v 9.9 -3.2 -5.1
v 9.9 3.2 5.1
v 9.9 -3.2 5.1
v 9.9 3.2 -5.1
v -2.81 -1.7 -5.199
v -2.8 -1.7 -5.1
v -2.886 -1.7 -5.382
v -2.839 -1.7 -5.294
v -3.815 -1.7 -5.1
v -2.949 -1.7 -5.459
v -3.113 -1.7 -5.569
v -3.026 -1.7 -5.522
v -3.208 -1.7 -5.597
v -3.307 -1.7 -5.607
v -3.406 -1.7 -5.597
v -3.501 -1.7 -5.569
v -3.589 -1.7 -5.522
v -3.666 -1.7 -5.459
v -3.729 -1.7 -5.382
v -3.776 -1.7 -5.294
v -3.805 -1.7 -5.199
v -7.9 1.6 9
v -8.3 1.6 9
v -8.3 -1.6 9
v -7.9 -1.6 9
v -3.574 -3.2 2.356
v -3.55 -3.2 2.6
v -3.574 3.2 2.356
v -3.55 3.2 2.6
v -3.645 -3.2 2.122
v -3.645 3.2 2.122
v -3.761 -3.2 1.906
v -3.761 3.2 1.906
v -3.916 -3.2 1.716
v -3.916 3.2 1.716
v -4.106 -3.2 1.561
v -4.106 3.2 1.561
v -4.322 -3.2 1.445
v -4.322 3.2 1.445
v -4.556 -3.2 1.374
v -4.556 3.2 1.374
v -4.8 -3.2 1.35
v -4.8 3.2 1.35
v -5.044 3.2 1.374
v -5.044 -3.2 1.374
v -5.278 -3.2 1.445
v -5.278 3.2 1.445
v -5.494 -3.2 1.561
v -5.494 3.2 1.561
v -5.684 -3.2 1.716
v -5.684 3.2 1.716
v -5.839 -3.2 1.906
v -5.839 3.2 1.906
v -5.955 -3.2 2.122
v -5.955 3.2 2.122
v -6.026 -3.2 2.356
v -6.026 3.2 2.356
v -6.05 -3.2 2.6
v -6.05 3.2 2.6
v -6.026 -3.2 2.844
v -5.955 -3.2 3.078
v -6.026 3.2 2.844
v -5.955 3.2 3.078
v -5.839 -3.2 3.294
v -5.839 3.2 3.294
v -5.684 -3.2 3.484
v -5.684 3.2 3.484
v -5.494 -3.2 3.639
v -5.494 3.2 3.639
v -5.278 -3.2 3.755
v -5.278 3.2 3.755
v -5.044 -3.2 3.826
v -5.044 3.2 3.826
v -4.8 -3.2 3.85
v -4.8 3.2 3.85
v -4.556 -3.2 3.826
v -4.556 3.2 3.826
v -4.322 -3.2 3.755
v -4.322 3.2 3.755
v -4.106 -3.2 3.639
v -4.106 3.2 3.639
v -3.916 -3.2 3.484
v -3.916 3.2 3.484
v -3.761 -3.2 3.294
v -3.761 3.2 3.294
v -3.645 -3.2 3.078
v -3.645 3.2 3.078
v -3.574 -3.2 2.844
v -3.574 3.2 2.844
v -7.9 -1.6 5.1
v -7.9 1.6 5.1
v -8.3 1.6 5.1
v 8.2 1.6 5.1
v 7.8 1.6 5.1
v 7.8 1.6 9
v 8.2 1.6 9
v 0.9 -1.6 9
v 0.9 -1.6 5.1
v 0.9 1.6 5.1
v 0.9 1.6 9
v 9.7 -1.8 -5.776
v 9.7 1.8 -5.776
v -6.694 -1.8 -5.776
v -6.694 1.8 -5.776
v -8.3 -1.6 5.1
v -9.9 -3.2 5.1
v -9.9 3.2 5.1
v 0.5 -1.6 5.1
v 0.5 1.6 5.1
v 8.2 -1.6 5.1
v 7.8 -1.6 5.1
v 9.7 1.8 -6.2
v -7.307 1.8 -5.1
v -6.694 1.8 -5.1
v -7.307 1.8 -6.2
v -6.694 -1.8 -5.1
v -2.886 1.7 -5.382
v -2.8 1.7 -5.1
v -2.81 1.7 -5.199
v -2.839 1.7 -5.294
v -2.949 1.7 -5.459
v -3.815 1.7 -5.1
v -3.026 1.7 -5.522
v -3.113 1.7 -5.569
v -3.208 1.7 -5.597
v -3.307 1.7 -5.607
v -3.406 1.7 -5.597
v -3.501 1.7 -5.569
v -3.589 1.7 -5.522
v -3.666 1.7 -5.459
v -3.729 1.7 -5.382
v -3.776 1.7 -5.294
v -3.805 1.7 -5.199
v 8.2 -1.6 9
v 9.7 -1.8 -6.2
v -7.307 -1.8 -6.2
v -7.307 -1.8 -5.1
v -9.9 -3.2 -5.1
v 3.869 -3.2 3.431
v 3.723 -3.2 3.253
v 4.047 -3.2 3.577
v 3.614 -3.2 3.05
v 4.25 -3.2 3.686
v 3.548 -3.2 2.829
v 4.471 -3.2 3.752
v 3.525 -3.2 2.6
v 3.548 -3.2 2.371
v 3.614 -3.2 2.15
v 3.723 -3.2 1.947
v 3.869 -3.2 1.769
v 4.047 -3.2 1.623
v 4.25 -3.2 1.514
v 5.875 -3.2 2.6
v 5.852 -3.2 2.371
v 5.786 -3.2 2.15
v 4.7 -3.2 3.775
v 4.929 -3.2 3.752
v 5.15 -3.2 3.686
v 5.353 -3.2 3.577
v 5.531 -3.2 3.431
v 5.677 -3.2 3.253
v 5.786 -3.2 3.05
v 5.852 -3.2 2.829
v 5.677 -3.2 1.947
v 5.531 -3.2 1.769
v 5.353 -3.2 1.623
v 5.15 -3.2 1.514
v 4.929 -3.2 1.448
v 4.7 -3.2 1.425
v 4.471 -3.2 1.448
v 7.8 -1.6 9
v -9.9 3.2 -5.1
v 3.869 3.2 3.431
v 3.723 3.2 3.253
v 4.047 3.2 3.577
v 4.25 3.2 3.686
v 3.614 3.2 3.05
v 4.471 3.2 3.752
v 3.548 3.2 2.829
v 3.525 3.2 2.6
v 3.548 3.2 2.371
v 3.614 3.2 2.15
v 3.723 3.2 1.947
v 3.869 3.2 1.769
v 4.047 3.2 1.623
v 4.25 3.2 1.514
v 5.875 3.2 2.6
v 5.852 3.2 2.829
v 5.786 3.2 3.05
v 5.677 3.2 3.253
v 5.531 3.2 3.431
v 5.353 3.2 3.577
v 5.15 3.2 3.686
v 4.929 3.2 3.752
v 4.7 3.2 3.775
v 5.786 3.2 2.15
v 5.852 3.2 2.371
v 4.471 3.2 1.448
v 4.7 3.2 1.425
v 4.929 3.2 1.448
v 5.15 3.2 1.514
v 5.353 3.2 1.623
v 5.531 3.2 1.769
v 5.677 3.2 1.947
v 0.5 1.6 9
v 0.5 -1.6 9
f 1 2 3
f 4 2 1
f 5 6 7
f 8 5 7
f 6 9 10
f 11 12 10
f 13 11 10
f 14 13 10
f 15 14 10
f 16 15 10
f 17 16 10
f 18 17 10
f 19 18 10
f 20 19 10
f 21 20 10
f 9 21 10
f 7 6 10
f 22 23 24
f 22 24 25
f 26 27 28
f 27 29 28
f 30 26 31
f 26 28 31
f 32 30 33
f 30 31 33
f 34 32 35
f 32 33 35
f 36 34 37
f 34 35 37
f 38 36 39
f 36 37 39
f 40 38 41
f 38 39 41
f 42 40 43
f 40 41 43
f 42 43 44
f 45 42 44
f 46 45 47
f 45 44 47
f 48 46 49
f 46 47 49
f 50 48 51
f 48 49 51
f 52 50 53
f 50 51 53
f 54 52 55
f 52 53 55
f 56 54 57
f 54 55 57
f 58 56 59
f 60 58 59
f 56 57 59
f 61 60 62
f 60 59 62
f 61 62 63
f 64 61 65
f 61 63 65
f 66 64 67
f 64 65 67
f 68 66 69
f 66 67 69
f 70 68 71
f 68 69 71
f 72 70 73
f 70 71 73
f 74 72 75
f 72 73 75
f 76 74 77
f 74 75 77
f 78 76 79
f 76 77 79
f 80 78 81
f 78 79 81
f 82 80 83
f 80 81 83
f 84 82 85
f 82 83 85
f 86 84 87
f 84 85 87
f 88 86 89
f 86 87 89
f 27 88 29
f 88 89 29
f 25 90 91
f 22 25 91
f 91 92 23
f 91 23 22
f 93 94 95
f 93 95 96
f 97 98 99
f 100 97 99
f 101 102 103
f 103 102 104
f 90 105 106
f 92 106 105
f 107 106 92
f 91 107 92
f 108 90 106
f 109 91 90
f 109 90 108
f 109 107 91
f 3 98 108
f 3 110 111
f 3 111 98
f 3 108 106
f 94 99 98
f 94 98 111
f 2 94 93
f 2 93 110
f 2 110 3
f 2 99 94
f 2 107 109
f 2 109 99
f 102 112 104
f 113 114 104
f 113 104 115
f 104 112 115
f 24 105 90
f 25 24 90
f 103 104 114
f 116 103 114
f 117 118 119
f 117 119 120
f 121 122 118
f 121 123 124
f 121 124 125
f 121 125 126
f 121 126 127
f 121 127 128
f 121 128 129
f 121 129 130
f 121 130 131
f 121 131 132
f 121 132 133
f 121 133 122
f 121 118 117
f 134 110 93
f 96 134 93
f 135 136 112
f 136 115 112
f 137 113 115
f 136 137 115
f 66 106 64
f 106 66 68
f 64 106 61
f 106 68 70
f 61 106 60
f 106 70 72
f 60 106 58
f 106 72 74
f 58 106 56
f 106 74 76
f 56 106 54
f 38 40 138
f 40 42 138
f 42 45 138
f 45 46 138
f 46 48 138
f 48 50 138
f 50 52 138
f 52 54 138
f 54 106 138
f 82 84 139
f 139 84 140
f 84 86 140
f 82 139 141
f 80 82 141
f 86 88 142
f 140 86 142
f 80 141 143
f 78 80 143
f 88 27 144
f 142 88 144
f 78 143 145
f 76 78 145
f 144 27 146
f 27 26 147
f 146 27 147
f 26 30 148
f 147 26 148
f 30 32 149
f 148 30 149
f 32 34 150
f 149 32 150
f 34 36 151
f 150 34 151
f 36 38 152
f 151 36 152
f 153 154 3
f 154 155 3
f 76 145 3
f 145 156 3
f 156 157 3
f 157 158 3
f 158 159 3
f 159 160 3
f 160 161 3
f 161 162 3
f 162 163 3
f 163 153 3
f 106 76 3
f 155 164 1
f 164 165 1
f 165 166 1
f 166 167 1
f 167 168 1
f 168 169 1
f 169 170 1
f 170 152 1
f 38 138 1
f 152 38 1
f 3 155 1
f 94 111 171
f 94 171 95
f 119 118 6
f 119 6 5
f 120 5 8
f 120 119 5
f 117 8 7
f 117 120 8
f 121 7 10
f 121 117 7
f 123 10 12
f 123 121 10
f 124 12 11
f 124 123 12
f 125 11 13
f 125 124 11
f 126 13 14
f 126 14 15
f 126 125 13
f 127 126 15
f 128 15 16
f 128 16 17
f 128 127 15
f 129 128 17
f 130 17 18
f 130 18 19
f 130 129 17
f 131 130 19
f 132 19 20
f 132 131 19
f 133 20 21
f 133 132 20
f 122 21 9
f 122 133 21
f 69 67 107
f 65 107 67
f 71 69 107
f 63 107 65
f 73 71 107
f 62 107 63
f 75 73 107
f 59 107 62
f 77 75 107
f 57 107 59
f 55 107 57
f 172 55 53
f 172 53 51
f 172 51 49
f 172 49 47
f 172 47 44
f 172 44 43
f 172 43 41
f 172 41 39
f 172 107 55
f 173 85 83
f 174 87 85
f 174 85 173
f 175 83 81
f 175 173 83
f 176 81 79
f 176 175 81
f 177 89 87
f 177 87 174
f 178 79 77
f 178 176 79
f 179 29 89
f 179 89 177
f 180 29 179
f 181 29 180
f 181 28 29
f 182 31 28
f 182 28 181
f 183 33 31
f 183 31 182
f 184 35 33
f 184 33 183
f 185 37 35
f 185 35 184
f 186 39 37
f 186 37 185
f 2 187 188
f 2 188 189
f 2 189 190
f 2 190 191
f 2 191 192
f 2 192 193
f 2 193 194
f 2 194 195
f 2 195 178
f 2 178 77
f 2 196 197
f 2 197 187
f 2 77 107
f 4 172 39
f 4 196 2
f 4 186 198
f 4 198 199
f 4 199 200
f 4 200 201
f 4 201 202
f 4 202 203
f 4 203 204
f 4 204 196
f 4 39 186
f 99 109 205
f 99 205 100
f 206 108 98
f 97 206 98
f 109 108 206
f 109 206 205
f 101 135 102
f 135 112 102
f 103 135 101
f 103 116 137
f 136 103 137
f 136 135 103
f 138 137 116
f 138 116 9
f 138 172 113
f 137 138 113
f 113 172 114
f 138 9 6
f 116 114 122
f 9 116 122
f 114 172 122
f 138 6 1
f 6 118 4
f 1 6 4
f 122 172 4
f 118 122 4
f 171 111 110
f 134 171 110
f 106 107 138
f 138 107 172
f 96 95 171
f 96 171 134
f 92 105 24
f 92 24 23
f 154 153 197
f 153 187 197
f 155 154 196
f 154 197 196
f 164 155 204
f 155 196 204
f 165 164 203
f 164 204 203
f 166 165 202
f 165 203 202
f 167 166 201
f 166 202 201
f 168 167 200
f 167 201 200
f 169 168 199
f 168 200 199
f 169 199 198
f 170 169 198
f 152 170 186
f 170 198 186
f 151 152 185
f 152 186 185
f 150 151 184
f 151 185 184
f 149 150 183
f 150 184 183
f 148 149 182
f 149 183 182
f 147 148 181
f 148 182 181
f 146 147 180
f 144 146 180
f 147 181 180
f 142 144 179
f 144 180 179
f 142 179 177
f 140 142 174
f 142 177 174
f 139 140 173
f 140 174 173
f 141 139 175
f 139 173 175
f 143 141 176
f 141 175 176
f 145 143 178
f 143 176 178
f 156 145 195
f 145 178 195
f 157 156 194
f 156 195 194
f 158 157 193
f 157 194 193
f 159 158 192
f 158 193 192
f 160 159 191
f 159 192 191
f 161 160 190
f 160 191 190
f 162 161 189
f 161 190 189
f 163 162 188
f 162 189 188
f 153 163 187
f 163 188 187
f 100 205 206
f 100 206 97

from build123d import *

# Parameters (mm, degrees)
SKETCH1_W               = 19.8
SKETCH1_H               = 10.2
BOSS_EXTRUDE1_DEPTH     = 3.2
SKETCH2_R               = 1.25
SKETCH2_R_2             = 1.175
CUT_EXTRUDE1_DEPTH      = 4.2
CUT_EXTRUDE1_DEPTH_BACK = 4.2
BOSS_EXTRUDE2_DEPTH     = 1.8
SKETCH4_W               = 0.4
SKETCH4_H               = 3.2
BOSS_EXTRUDE3_DEPTH     = 3.9
LPATTERN1_COUNT         = 2
LPATTERN1_PITCH         = 8.8
LPATTERN2_COUNT         = 2
LPATTERN2_PITCH         = 16.1
SKETCH5_R               = 0.507136528
BOSS_EXTRUDE4_DEPTH     = 1.7


with BuildPart() as part:
    # Sketch1 → Boss-Extrude1 (new body, symmetric)
    with BuildSketch(Plane(origin=(0, 0, 0), x_dir=(1, 0, 0), z_dir=(0, 1, 0))):
        Rectangle(SKETCH1_W, SKETCH1_H)
    extrude(amount=BOSS_EXTRUDE1_DEPTH, both=True)

    # Sketch2 → Cut-Extrude1 (cut, two sides)
    with BuildSketch(Plane(origin=(0, 0, 0), x_dir=(1, 0, 0), z_dir=(0, 1, 0))) as cut_extrude1_sk:
        with Locations((-4.8, -2.6)):
            Circle(SKETCH2_R)
        with Locations((4.7, -2.6)):
            Circle(SKETCH2_R_2)
    extrude(amount=CUT_EXTRUDE1_DEPTH, mode=Mode.SUBTRACT)
    extrude(cut_extrude1_sk.sketch, amount=-CUT_EXTRUDE1_DEPTH_BACK, mode=Mode.SUBTRACT)

    # Sketch3 → Boss-Extrude2 (add, symmetric)
    with BuildSketch(Plane(origin=(0, 0, 0), x_dir=(1, 0, 0), z_dir=(0, 1, 0))):
        Polygon((-7.306635191, 5.1), (-7.306635191, 6.2), (9.7, 6.2), (9.7, 5.775620591), (-6.694229351, 5.775620591), (-6.694229351, 5.1), align=None)
    extrude(amount=BOSS_EXTRUDE2_DEPTH, both=True)

    # Sketch4 → Boss-Extrude3 (add)
    with BuildSketch(Plane.XY.offset(5.1)):
        with Locations((-8.1, 0)):
            Rectangle(SKETCH4_W, SKETCH4_H)
    boss_extrude3 = extrude(amount=BOSS_EXTRUDE3_DEPTH)

    # LPattern1: Boss-Extrude3 ×2
    with Locations(*[(i * LPATTERN1_PITCH, 0, 0) for i in range(1, LPATTERN1_COUNT)]):
        add(boss_extrude3)

    # LPattern2: Boss-Extrude3 ×2
    with Locations(*[(i * LPATTERN2_PITCH, 0, 0) for i in range(1, LPATTERN2_COUNT)]):
        add(boss_extrude3)

    # Sketch5 → Boss-Extrude4 (add, symmetric)
    with BuildSketch(Plane(origin=(0, 0, 0), x_dir=(1, 0, 0), z_dir=(0, 1, 0))):
        with Locations((-3.307427246, 5.1)):
            Circle(SKETCH5_R)
    extrude(amount=BOSS_EXTRUDE4_DEPTH, both=True)


solid = part.part
